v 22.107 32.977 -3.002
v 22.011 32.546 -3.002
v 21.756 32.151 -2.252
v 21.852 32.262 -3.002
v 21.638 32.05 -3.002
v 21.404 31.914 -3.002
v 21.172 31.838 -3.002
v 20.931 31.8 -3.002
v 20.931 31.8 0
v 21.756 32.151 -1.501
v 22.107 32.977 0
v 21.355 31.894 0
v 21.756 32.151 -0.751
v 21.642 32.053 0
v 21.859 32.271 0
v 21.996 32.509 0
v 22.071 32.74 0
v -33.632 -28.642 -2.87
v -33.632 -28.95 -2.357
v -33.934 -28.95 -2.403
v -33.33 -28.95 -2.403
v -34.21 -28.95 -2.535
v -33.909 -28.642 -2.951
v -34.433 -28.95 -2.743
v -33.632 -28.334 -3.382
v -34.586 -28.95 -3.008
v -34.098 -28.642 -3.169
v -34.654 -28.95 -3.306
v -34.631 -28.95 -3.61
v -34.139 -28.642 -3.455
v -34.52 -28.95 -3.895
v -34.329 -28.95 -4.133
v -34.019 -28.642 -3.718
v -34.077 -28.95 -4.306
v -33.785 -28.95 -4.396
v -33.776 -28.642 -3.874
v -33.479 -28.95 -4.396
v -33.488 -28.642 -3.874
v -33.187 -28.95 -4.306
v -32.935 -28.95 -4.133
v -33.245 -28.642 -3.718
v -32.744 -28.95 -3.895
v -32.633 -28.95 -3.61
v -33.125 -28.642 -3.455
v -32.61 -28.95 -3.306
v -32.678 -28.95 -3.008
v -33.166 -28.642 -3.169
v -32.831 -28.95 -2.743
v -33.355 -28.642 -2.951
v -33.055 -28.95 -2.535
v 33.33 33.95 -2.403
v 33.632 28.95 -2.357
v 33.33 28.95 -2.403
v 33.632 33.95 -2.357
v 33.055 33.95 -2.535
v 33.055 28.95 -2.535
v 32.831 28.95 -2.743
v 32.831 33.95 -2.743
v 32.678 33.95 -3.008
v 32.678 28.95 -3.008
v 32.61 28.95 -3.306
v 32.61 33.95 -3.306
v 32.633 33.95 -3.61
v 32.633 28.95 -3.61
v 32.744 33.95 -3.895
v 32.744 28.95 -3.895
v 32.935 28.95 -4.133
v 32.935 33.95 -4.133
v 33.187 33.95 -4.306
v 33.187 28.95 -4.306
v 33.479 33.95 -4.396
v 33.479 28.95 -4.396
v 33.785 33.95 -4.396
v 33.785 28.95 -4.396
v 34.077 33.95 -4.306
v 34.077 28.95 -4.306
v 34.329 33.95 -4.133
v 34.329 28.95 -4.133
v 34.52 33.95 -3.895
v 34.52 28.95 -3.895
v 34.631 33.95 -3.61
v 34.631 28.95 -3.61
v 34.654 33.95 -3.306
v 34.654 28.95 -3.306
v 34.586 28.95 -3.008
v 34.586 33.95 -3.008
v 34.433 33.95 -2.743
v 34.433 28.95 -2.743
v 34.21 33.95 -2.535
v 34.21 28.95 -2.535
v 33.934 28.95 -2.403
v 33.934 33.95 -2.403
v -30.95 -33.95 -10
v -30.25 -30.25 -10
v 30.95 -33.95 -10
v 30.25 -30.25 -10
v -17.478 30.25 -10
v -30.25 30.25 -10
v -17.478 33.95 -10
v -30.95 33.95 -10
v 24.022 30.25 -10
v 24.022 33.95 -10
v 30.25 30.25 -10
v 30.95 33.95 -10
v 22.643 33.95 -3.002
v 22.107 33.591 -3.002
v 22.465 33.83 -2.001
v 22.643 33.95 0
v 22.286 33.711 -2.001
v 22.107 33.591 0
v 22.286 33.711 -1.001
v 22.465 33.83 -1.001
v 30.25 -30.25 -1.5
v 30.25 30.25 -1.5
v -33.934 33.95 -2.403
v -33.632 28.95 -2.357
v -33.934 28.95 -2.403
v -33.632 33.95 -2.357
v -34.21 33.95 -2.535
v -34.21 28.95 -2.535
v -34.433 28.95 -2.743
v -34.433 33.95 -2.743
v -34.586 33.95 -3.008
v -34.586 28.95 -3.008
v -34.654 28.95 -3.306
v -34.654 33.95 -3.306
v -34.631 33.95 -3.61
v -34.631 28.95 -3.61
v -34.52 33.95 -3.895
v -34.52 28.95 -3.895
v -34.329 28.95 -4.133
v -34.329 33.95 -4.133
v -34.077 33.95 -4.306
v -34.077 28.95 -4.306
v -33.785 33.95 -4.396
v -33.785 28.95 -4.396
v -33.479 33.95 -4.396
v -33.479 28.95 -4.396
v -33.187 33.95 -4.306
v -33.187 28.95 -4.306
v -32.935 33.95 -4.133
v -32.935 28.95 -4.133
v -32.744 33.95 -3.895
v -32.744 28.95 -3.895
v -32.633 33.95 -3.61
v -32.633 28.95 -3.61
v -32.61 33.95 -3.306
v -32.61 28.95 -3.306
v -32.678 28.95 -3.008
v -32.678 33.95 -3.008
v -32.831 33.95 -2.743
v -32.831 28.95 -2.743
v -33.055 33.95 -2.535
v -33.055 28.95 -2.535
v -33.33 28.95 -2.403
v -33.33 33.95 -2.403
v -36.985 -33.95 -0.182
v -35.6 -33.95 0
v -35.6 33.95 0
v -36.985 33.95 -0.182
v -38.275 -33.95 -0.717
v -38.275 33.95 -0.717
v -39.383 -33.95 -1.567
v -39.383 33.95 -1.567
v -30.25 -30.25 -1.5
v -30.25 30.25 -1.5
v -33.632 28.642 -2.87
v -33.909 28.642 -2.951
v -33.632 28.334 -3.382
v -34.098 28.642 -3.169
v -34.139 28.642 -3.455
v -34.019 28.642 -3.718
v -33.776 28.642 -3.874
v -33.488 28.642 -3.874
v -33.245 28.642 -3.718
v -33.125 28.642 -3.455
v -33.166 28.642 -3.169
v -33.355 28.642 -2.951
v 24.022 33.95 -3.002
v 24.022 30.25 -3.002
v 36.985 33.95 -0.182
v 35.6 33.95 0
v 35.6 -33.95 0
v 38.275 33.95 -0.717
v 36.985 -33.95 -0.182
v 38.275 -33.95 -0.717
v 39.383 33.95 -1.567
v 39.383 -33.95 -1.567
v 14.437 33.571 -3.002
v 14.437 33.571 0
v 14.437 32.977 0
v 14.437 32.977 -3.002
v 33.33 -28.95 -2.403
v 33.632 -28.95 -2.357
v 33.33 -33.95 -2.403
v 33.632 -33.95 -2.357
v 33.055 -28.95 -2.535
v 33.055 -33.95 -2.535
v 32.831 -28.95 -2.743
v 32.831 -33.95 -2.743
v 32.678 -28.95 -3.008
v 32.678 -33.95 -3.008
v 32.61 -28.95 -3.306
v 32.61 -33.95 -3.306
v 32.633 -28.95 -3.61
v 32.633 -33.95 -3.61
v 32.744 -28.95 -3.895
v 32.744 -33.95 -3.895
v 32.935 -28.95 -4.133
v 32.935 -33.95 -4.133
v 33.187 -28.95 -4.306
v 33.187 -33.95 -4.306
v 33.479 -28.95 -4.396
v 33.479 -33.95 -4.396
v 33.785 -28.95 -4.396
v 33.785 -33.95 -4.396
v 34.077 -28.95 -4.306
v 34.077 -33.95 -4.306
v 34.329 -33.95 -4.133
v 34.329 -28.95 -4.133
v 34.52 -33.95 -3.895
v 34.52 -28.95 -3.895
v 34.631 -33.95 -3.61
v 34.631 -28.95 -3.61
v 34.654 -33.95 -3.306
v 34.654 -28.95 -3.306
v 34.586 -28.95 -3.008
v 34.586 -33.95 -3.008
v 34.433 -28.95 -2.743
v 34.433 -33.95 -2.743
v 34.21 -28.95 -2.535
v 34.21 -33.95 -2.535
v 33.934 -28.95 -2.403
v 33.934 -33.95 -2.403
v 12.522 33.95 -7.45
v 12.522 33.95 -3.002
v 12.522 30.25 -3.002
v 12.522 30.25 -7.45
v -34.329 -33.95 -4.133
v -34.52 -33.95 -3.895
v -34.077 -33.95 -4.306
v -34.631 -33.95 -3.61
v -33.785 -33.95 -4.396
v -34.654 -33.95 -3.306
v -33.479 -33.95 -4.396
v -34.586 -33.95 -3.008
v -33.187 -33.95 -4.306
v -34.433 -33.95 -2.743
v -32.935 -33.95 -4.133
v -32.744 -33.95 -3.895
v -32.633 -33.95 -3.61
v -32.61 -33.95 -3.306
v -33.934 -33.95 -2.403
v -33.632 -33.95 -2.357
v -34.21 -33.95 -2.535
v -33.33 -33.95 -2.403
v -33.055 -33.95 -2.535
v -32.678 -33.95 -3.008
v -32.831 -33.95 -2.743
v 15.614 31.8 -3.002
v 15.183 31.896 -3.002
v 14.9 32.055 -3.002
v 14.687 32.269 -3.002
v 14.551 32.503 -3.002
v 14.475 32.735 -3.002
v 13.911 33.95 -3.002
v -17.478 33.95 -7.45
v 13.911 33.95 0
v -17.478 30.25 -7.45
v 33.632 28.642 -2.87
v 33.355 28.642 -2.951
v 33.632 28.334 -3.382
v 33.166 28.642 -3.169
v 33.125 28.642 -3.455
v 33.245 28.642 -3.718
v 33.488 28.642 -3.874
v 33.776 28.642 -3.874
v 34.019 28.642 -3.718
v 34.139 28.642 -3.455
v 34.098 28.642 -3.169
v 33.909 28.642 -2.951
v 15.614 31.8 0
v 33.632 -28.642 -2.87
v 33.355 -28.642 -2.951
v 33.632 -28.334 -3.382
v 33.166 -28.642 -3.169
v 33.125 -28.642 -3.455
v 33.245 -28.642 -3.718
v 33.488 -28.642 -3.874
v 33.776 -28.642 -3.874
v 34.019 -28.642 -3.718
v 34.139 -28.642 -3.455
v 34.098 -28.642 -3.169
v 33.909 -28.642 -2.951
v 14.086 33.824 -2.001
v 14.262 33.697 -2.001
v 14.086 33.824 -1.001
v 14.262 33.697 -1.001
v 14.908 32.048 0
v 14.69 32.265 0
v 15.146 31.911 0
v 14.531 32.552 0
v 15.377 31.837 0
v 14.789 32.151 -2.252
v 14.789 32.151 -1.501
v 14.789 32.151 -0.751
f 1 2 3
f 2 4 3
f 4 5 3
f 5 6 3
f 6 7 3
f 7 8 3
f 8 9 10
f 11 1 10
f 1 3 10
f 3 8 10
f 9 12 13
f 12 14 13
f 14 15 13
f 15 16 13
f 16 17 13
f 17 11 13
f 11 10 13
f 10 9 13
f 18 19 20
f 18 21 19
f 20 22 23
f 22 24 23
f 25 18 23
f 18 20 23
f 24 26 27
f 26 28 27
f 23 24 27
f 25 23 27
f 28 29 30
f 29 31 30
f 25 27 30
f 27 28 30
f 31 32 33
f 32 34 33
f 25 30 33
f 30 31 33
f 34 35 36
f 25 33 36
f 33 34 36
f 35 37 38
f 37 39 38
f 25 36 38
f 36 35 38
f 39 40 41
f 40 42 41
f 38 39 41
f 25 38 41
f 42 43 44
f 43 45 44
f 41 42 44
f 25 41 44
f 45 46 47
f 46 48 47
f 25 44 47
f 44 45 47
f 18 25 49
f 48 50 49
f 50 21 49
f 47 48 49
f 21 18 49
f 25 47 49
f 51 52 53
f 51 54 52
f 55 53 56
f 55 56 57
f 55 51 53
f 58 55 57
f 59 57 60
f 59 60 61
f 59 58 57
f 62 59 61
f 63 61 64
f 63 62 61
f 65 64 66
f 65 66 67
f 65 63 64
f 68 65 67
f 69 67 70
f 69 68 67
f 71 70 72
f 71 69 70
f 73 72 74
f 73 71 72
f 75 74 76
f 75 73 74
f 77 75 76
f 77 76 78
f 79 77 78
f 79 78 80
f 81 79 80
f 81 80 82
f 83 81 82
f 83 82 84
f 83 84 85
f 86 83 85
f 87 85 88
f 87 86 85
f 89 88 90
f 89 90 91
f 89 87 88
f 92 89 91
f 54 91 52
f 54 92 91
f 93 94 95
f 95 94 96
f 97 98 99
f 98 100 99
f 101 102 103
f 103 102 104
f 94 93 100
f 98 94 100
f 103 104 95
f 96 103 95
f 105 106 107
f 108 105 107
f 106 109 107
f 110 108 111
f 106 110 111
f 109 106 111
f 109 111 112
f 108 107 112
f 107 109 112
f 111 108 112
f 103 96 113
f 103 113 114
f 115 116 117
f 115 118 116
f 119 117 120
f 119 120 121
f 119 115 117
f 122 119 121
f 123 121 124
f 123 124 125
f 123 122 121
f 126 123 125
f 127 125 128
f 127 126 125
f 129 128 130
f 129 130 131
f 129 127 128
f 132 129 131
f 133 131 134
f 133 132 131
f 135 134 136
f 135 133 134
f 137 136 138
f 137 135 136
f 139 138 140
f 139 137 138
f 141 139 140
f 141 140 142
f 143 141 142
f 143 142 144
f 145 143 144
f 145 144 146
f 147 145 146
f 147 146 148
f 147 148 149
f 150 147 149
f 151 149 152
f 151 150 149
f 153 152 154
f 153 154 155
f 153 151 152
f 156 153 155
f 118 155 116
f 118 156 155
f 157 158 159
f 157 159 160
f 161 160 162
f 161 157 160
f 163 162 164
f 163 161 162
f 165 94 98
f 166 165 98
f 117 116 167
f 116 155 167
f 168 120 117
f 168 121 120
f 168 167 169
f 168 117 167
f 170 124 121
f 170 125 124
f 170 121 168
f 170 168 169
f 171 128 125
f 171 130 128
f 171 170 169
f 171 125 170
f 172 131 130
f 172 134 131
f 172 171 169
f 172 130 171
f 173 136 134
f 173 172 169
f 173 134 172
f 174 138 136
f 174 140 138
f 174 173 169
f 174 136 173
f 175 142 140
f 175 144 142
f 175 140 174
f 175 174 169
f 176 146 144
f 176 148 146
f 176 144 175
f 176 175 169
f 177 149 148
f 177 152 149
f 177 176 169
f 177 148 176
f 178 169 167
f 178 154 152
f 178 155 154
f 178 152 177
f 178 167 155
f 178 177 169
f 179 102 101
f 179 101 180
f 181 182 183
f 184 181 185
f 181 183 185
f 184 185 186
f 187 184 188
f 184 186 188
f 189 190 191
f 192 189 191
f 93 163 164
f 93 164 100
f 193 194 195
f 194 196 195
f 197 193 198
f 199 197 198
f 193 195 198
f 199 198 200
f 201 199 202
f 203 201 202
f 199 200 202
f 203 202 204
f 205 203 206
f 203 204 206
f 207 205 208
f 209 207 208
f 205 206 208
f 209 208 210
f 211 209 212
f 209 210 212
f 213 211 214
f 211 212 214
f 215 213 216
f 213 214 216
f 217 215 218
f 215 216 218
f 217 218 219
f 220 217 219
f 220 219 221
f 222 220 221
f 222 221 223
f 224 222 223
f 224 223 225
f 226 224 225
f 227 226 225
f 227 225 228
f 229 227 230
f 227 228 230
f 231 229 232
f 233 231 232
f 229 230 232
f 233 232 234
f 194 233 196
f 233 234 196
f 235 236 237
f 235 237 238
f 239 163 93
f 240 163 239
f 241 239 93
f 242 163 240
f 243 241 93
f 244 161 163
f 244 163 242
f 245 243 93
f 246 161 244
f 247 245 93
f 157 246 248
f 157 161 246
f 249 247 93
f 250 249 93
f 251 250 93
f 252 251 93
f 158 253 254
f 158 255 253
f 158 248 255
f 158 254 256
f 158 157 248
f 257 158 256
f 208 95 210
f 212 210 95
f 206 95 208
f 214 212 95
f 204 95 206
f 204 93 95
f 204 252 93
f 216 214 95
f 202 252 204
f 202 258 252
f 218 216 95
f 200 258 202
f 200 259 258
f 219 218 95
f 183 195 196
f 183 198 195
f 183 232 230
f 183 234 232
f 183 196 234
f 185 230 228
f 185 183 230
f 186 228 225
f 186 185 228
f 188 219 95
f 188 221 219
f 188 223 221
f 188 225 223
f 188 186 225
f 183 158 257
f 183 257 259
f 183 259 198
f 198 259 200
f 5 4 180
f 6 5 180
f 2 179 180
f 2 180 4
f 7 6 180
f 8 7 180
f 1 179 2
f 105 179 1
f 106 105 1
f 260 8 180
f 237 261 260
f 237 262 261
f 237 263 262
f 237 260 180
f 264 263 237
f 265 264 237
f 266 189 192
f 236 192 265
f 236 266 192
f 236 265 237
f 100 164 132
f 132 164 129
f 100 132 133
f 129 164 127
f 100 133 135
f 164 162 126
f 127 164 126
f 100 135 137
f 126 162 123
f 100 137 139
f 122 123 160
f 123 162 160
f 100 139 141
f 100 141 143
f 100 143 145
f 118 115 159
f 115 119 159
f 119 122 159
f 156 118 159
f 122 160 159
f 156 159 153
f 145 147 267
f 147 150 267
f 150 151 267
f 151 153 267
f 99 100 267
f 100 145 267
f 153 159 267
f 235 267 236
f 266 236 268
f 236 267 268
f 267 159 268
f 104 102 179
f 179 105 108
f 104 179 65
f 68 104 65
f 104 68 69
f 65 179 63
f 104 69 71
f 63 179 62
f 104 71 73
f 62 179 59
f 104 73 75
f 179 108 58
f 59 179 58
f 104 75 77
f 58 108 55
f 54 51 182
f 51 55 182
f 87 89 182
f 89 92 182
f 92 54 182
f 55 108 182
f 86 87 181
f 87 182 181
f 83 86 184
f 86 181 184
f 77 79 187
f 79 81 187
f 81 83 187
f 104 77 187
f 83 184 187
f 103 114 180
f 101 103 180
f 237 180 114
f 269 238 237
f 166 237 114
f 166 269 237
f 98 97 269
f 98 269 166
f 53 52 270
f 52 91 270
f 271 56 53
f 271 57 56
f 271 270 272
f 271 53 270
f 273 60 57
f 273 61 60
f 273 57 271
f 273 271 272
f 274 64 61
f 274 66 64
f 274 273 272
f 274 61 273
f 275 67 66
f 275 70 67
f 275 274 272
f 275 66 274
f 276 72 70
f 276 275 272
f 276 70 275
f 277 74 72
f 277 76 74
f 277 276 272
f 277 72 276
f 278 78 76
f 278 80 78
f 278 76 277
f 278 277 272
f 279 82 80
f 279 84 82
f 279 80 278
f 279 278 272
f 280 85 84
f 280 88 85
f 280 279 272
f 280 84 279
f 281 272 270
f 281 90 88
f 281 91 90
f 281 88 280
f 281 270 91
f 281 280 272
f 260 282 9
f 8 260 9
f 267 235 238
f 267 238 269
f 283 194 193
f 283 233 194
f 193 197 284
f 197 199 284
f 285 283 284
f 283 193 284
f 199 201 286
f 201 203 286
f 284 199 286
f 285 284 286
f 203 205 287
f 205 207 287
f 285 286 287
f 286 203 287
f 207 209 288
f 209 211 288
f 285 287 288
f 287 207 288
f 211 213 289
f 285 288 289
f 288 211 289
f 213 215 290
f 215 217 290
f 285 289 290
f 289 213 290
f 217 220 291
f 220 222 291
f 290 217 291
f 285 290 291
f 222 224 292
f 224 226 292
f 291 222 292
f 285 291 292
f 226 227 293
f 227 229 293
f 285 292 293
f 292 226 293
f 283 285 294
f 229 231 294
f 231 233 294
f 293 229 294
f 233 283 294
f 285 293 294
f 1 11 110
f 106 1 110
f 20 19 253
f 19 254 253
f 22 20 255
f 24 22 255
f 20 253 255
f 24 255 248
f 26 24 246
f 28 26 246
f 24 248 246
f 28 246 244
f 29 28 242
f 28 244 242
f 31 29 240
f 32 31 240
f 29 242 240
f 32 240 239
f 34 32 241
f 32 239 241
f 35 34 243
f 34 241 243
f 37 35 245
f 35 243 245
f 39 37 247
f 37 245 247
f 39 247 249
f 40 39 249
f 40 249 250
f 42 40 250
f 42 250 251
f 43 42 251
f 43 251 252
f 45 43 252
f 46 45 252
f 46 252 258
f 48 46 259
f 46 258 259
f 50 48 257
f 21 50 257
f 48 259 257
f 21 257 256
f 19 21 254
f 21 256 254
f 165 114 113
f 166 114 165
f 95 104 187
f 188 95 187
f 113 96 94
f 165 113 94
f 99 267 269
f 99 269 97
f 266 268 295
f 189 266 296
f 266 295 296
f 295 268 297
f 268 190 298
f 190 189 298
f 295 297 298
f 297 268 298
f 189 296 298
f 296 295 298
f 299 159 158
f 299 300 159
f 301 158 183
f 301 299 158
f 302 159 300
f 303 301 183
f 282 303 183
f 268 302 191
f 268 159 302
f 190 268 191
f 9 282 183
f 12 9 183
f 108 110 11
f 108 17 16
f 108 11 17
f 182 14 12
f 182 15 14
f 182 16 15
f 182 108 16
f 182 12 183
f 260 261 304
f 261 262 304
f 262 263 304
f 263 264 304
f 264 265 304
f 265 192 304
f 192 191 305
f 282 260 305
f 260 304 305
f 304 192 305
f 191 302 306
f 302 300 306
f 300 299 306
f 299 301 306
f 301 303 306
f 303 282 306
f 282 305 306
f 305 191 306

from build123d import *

# Parameters (mm, degrees)
SKETCH_1_W            = 81.9
SKETCH_1_H            = 67.9
EXTRUDE_1_DEPTH       = 10
SKETCH_2_W            = 60.5
SKETCH_2_H            = 60.5
CUT_EXTRUDE_1_DEPTH   = 8.5
CUT_EXTRUDE_4_REACH   = 91.242
M2_5X0_451_AT_2_COUNT = 2
M2_5X0_451_AT_2_PITCH = 67.264213562
CUT_EXTRUDE_5_REACH   = 81.921
CUT_EXTRUDE_6_REACH   = 81.129
CUT_EXTRUDE_7_REACH   = 54.949


with BuildPart() as part:
    # Эскиз1 → Бобышка-Вытянуть1 (new body)
    with BuildSketch(Plane.XY):
        Rectangle(SKETCH_1_W, SKETCH_1_H)
    extrude(amount=-EXTRUDE_1_DEPTH)

    # Эскиз2 → Вырез-Вытянуть1 (cut)
    with BuildSketch(Plane(origin=(0, 0, -10), x_dir=(-1, 0, 0), z_dir=(0, 0, -1))):
        Rectangle(SKETCH_2_W, SKETCH_2_H)
    extrude(amount=-CUT_EXTRUDE_1_DEPTH, mode=Mode.SUBTRACT)

    # Эскиз4 → Вырез-Вытянуть4 (cut, up to next)
    with BuildSketch(Plane(origin=(0, -33.95, -40.95), x_dir=(1, 0, 0), z_dir=(0, 1, 0)), mode=Mode.PRIVATE) as cut_extrude_4_sk1:
        with BuildLine():
            Line((39.383021279, -39.383021279), (40.95, -40.95))
            Line((40.95, -40.95), (35.6, -40.95))
            ThreePointArc((35.6, -40.95), (37.647356363, -40.542755499), (39.383021279, -39.383021279))
        make_face()
    cut_extrude_4_tool1 = extrude(cut_extrude_4_sk1.sketch, amount=CUT_EXTRUDE_4_REACH, mode=Mode.PRIVATE) & part.part
    # Эскиз4 → Вырез-Вытянуть4 (cut, up to next)
    with BuildSketch(Plane(origin=(0, -33.95, -40.95), x_dir=(1, 0, 0), z_dir=(0, 1, 0)), mode=Mode.PRIVATE) as cut_extrude_4_sk2:
        with BuildLine():
            Line((-40.95, -40.95), (-35.6, -40.95))
            ThreePointArc((-35.6, -40.95), (-37.647356363, -40.542755499), (-39.383021279, -39.383021279))
            Line((-39.383021279, -39.383021279), (-40.95, -40.95))
        make_face()
    cut_extrude_4_tool2 = extrude(cut_extrude_4_sk2.sketch, amount=CUT_EXTRUDE_4_REACH, mode=Mode.PRIVATE) & part.part
    add(cut_extrude_4_tool1.solids().sort_by_distance((39.042099, -33.95, -0.482136))[0], mode=Mode.SUBTRACT)
    add(cut_extrude_4_tool2.solids().sort_by_distance((-39.042099, -33.95, -0.482136))[0], mode=Mode.SUBTRACT)

    # Эскиз8 → Отверстие обработанное метчиком M2.5x0.451 (revolve, cut)
    with BuildSketch(Plane(origin=(33.632106781, 33.95, -3.382106781), x_dir=(0, 0, 1), z_dir=(1, 0, 0))):
        Polygon((0, 0), (0, 5.615882135), (1.025, 5), (1.025, 0), align=None)
    m2_5x0_451 = revolve(axis=Axis((33.632106781, 40.3, -3.382106781), (0, -1, 0)), mode=Mode.SUBTRACT)

    # Отверстие обработанное метчиком M2.5x0.451 at 2: Отверстие обработанное метчиком M2.5x0.451 ×2
    with Locations(*[(-i * M2_5X0_451_AT_2_PITCH, 0, 0) for i in range(1, M2_5X0_451_AT_2_COUNT)]):
        add(m2_5x0_451, mode=Mode.SUBTRACT)

    # Зеркальное отражение1: Отверстие обработанное метчиком M2.5x0.451 across plane
    add(m2_5x0_451.mirror(Plane.ZX), mode=Mode.SUBTRACT)

    # Зеркальное отражение1 copy 1 sketch → Зеркальное отражение1 copy 1 (revolve, cut)
    with BuildSketch(Plane(origin=(-33.632106781, -33.95, -3.382106781), x_dir=(0, 0, 1), z_dir=(1, 0, 0))):
        Polygon((0, 0), (0, -5.615882135), (1.025, -5), (1.025, 0), align=None)
    revolve(axis=Axis((-33.632106781, -40.3, -3.382106781), (0, -1, 0)), mode=Mode.SUBTRACT)

    # Эскиз3 → Вырез-Вытянуть5 (cut, up to next)
    with BuildSketch(Plane(origin=(0, 33.95, 0), x_dir=(1, 0, 0), z_dir=(0, 1, 0)), mode=Mode.PRIVATE) as cut_extrude_5_sk1:
        Polygon((30.95, 10), (40.95, 0), (40.95, 10), align=None)
    cut_extrude_5_tool1 = extrude(cut_extrude_5_sk1.sketch, amount=-CUT_EXTRUDE_5_REACH, mode=Mode.PRIVATE) & part.part
    # Эскиз3 → Вырез-Вытянуть5 (cut, up to next)
    with BuildSketch(Plane(origin=(0, 33.95, 0), x_dir=(1, 0, 0), z_dir=(0, 1, 0)), mode=Mode.PRIVATE) as cut_extrude_5_sk2:
        Polygon((-30.95, 10), (-40.95, 10), (-40.95, 0), align=None)
    cut_extrude_5_tool2 = extrude(cut_extrude_5_sk2.sketch, amount=-CUT_EXTRUDE_5_REACH, mode=Mode.PRIVATE) & part.part
    add(cut_extrude_5_tool1.solids().sort_by_distance((37.616667, 33.95, -6.666667))[0], mode=Mode.SUBTRACT)
    add(cut_extrude_5_tool2.solids().sort_by_distance((-37.616667, 33.95, -6.666667))[0], mode=Mode.SUBTRACT)

    # Эскиз10 → Вырез-Вытянуть6 (cut, up to next)
    with BuildSketch(Plane(origin=(0, 33.95, 0), x_dir=(1, 0, 0), z_dir=(0, 1, 0)), mode=Mode.PRIVATE) as cut_extrude_6_sk1:
        Polygon((24.022188141, 3.002183714), (12.522188141, 3.002183714), (12.522188141, 7.45), (-17.477811859, 7.45), (-17.477811859, 10), (12.522188141, 10), (24.022188141, 10), align=None)
    cut_extrude_6_tool1 = extrude(cut_extrude_6_sk1.sketch, amount=-CUT_EXTRUDE_6_REACH, mode=Mode.PRIVATE) & part.part
    add(cut_extrude_6_tool1.solids().sort_by_distance((8.159902, 33.95, -7.584889))[0], mode=Mode.SUBTRACT)

    # Эскиз11 → Вырез-Вытянуть7 (cut, up to next)
    with BuildSketch(Plane.XY, mode=Mode.PRIVATE) as cut_extrude_7_sk1:
        with BuildLine():
            Line((14.437188141, 33.571201289), (14.437188141, 32.976592334))
            add(Edge.make_bspline(
                [(14.437188141, 32.976592334), (14.451126829, 32.828049776), (14.506397384, 32.534626701), (14.763436949, 32.126248808), (15.171814842, 31.869209242), (15.465237917, 31.813938687), (15.613780476, 31.8)],
                knots=[-0.018208692, -0.018208692, -0.018208692, -0.018208692, 0.240895654, 0.5, 0.759104346, 1.018208692, 1.018208692, 1.018208692, 1.018208692], degree=3))
            Line((15.613780476, 31.8), (20.930595807, 31.8))
            add(Edge.make_bspline(
                [(20.930595807, 31.8), (21.079138366, 31.813938687), (21.37256144, 31.869209242), (21.780939333, 32.126248808), (22.037978899, 32.534626701), (22.093249454, 32.828049776), (22.107188141, 32.976592334)],
                knots=[-0.018208692, -0.018208692, -0.018208692, -0.018208692, 0.240895654, 0.5, 0.759104346, 1.018208692, 1.018208692, 1.018208692, 1.018208692], degree=3))
            Line((22.107188141, 32.976592334), (22.107188141, 33.591493881))
            add(Edge.make_bspline(
                [(22.107188141, 33.591493881), (22.535068025, 33.877662587), (22.962947908, 34.163831294), (23.390827792, 34.45)],
                knots=[1.333301569, 1.333301569, 1.333301569, 1.333301569, 6.343818338, 6.343818338, 6.343818338, 6.343818338], degree=3))
            Line((23.390827792, 34.45), (13.216758216, 34.45))
            add(Edge.make_bspline(
                [(13.216758216, 34.45), (13.623568191, 34.157067096), (14.030378166, 33.864134193), (14.437188141, 33.571201289)],
                knots=[1.296985877, 1.296985877, 1.296985877, 1.296985877, 5.968647001, 5.968647001, 5.968647001, 5.968647001], degree=3))
        make_face()
    cut_extrude_7_tool1 = extrude(cut_extrude_7_sk1.sketch, amount=-CUT_EXTRUDE_7_REACH, mode=Mode.PRIVATE) & part.part
    add(cut_extrude_7_tool1.solids().sort_by_distance((18.275758, 33.211289, 0))[0], mode=Mode.SUBTRACT)


solid = part.part
